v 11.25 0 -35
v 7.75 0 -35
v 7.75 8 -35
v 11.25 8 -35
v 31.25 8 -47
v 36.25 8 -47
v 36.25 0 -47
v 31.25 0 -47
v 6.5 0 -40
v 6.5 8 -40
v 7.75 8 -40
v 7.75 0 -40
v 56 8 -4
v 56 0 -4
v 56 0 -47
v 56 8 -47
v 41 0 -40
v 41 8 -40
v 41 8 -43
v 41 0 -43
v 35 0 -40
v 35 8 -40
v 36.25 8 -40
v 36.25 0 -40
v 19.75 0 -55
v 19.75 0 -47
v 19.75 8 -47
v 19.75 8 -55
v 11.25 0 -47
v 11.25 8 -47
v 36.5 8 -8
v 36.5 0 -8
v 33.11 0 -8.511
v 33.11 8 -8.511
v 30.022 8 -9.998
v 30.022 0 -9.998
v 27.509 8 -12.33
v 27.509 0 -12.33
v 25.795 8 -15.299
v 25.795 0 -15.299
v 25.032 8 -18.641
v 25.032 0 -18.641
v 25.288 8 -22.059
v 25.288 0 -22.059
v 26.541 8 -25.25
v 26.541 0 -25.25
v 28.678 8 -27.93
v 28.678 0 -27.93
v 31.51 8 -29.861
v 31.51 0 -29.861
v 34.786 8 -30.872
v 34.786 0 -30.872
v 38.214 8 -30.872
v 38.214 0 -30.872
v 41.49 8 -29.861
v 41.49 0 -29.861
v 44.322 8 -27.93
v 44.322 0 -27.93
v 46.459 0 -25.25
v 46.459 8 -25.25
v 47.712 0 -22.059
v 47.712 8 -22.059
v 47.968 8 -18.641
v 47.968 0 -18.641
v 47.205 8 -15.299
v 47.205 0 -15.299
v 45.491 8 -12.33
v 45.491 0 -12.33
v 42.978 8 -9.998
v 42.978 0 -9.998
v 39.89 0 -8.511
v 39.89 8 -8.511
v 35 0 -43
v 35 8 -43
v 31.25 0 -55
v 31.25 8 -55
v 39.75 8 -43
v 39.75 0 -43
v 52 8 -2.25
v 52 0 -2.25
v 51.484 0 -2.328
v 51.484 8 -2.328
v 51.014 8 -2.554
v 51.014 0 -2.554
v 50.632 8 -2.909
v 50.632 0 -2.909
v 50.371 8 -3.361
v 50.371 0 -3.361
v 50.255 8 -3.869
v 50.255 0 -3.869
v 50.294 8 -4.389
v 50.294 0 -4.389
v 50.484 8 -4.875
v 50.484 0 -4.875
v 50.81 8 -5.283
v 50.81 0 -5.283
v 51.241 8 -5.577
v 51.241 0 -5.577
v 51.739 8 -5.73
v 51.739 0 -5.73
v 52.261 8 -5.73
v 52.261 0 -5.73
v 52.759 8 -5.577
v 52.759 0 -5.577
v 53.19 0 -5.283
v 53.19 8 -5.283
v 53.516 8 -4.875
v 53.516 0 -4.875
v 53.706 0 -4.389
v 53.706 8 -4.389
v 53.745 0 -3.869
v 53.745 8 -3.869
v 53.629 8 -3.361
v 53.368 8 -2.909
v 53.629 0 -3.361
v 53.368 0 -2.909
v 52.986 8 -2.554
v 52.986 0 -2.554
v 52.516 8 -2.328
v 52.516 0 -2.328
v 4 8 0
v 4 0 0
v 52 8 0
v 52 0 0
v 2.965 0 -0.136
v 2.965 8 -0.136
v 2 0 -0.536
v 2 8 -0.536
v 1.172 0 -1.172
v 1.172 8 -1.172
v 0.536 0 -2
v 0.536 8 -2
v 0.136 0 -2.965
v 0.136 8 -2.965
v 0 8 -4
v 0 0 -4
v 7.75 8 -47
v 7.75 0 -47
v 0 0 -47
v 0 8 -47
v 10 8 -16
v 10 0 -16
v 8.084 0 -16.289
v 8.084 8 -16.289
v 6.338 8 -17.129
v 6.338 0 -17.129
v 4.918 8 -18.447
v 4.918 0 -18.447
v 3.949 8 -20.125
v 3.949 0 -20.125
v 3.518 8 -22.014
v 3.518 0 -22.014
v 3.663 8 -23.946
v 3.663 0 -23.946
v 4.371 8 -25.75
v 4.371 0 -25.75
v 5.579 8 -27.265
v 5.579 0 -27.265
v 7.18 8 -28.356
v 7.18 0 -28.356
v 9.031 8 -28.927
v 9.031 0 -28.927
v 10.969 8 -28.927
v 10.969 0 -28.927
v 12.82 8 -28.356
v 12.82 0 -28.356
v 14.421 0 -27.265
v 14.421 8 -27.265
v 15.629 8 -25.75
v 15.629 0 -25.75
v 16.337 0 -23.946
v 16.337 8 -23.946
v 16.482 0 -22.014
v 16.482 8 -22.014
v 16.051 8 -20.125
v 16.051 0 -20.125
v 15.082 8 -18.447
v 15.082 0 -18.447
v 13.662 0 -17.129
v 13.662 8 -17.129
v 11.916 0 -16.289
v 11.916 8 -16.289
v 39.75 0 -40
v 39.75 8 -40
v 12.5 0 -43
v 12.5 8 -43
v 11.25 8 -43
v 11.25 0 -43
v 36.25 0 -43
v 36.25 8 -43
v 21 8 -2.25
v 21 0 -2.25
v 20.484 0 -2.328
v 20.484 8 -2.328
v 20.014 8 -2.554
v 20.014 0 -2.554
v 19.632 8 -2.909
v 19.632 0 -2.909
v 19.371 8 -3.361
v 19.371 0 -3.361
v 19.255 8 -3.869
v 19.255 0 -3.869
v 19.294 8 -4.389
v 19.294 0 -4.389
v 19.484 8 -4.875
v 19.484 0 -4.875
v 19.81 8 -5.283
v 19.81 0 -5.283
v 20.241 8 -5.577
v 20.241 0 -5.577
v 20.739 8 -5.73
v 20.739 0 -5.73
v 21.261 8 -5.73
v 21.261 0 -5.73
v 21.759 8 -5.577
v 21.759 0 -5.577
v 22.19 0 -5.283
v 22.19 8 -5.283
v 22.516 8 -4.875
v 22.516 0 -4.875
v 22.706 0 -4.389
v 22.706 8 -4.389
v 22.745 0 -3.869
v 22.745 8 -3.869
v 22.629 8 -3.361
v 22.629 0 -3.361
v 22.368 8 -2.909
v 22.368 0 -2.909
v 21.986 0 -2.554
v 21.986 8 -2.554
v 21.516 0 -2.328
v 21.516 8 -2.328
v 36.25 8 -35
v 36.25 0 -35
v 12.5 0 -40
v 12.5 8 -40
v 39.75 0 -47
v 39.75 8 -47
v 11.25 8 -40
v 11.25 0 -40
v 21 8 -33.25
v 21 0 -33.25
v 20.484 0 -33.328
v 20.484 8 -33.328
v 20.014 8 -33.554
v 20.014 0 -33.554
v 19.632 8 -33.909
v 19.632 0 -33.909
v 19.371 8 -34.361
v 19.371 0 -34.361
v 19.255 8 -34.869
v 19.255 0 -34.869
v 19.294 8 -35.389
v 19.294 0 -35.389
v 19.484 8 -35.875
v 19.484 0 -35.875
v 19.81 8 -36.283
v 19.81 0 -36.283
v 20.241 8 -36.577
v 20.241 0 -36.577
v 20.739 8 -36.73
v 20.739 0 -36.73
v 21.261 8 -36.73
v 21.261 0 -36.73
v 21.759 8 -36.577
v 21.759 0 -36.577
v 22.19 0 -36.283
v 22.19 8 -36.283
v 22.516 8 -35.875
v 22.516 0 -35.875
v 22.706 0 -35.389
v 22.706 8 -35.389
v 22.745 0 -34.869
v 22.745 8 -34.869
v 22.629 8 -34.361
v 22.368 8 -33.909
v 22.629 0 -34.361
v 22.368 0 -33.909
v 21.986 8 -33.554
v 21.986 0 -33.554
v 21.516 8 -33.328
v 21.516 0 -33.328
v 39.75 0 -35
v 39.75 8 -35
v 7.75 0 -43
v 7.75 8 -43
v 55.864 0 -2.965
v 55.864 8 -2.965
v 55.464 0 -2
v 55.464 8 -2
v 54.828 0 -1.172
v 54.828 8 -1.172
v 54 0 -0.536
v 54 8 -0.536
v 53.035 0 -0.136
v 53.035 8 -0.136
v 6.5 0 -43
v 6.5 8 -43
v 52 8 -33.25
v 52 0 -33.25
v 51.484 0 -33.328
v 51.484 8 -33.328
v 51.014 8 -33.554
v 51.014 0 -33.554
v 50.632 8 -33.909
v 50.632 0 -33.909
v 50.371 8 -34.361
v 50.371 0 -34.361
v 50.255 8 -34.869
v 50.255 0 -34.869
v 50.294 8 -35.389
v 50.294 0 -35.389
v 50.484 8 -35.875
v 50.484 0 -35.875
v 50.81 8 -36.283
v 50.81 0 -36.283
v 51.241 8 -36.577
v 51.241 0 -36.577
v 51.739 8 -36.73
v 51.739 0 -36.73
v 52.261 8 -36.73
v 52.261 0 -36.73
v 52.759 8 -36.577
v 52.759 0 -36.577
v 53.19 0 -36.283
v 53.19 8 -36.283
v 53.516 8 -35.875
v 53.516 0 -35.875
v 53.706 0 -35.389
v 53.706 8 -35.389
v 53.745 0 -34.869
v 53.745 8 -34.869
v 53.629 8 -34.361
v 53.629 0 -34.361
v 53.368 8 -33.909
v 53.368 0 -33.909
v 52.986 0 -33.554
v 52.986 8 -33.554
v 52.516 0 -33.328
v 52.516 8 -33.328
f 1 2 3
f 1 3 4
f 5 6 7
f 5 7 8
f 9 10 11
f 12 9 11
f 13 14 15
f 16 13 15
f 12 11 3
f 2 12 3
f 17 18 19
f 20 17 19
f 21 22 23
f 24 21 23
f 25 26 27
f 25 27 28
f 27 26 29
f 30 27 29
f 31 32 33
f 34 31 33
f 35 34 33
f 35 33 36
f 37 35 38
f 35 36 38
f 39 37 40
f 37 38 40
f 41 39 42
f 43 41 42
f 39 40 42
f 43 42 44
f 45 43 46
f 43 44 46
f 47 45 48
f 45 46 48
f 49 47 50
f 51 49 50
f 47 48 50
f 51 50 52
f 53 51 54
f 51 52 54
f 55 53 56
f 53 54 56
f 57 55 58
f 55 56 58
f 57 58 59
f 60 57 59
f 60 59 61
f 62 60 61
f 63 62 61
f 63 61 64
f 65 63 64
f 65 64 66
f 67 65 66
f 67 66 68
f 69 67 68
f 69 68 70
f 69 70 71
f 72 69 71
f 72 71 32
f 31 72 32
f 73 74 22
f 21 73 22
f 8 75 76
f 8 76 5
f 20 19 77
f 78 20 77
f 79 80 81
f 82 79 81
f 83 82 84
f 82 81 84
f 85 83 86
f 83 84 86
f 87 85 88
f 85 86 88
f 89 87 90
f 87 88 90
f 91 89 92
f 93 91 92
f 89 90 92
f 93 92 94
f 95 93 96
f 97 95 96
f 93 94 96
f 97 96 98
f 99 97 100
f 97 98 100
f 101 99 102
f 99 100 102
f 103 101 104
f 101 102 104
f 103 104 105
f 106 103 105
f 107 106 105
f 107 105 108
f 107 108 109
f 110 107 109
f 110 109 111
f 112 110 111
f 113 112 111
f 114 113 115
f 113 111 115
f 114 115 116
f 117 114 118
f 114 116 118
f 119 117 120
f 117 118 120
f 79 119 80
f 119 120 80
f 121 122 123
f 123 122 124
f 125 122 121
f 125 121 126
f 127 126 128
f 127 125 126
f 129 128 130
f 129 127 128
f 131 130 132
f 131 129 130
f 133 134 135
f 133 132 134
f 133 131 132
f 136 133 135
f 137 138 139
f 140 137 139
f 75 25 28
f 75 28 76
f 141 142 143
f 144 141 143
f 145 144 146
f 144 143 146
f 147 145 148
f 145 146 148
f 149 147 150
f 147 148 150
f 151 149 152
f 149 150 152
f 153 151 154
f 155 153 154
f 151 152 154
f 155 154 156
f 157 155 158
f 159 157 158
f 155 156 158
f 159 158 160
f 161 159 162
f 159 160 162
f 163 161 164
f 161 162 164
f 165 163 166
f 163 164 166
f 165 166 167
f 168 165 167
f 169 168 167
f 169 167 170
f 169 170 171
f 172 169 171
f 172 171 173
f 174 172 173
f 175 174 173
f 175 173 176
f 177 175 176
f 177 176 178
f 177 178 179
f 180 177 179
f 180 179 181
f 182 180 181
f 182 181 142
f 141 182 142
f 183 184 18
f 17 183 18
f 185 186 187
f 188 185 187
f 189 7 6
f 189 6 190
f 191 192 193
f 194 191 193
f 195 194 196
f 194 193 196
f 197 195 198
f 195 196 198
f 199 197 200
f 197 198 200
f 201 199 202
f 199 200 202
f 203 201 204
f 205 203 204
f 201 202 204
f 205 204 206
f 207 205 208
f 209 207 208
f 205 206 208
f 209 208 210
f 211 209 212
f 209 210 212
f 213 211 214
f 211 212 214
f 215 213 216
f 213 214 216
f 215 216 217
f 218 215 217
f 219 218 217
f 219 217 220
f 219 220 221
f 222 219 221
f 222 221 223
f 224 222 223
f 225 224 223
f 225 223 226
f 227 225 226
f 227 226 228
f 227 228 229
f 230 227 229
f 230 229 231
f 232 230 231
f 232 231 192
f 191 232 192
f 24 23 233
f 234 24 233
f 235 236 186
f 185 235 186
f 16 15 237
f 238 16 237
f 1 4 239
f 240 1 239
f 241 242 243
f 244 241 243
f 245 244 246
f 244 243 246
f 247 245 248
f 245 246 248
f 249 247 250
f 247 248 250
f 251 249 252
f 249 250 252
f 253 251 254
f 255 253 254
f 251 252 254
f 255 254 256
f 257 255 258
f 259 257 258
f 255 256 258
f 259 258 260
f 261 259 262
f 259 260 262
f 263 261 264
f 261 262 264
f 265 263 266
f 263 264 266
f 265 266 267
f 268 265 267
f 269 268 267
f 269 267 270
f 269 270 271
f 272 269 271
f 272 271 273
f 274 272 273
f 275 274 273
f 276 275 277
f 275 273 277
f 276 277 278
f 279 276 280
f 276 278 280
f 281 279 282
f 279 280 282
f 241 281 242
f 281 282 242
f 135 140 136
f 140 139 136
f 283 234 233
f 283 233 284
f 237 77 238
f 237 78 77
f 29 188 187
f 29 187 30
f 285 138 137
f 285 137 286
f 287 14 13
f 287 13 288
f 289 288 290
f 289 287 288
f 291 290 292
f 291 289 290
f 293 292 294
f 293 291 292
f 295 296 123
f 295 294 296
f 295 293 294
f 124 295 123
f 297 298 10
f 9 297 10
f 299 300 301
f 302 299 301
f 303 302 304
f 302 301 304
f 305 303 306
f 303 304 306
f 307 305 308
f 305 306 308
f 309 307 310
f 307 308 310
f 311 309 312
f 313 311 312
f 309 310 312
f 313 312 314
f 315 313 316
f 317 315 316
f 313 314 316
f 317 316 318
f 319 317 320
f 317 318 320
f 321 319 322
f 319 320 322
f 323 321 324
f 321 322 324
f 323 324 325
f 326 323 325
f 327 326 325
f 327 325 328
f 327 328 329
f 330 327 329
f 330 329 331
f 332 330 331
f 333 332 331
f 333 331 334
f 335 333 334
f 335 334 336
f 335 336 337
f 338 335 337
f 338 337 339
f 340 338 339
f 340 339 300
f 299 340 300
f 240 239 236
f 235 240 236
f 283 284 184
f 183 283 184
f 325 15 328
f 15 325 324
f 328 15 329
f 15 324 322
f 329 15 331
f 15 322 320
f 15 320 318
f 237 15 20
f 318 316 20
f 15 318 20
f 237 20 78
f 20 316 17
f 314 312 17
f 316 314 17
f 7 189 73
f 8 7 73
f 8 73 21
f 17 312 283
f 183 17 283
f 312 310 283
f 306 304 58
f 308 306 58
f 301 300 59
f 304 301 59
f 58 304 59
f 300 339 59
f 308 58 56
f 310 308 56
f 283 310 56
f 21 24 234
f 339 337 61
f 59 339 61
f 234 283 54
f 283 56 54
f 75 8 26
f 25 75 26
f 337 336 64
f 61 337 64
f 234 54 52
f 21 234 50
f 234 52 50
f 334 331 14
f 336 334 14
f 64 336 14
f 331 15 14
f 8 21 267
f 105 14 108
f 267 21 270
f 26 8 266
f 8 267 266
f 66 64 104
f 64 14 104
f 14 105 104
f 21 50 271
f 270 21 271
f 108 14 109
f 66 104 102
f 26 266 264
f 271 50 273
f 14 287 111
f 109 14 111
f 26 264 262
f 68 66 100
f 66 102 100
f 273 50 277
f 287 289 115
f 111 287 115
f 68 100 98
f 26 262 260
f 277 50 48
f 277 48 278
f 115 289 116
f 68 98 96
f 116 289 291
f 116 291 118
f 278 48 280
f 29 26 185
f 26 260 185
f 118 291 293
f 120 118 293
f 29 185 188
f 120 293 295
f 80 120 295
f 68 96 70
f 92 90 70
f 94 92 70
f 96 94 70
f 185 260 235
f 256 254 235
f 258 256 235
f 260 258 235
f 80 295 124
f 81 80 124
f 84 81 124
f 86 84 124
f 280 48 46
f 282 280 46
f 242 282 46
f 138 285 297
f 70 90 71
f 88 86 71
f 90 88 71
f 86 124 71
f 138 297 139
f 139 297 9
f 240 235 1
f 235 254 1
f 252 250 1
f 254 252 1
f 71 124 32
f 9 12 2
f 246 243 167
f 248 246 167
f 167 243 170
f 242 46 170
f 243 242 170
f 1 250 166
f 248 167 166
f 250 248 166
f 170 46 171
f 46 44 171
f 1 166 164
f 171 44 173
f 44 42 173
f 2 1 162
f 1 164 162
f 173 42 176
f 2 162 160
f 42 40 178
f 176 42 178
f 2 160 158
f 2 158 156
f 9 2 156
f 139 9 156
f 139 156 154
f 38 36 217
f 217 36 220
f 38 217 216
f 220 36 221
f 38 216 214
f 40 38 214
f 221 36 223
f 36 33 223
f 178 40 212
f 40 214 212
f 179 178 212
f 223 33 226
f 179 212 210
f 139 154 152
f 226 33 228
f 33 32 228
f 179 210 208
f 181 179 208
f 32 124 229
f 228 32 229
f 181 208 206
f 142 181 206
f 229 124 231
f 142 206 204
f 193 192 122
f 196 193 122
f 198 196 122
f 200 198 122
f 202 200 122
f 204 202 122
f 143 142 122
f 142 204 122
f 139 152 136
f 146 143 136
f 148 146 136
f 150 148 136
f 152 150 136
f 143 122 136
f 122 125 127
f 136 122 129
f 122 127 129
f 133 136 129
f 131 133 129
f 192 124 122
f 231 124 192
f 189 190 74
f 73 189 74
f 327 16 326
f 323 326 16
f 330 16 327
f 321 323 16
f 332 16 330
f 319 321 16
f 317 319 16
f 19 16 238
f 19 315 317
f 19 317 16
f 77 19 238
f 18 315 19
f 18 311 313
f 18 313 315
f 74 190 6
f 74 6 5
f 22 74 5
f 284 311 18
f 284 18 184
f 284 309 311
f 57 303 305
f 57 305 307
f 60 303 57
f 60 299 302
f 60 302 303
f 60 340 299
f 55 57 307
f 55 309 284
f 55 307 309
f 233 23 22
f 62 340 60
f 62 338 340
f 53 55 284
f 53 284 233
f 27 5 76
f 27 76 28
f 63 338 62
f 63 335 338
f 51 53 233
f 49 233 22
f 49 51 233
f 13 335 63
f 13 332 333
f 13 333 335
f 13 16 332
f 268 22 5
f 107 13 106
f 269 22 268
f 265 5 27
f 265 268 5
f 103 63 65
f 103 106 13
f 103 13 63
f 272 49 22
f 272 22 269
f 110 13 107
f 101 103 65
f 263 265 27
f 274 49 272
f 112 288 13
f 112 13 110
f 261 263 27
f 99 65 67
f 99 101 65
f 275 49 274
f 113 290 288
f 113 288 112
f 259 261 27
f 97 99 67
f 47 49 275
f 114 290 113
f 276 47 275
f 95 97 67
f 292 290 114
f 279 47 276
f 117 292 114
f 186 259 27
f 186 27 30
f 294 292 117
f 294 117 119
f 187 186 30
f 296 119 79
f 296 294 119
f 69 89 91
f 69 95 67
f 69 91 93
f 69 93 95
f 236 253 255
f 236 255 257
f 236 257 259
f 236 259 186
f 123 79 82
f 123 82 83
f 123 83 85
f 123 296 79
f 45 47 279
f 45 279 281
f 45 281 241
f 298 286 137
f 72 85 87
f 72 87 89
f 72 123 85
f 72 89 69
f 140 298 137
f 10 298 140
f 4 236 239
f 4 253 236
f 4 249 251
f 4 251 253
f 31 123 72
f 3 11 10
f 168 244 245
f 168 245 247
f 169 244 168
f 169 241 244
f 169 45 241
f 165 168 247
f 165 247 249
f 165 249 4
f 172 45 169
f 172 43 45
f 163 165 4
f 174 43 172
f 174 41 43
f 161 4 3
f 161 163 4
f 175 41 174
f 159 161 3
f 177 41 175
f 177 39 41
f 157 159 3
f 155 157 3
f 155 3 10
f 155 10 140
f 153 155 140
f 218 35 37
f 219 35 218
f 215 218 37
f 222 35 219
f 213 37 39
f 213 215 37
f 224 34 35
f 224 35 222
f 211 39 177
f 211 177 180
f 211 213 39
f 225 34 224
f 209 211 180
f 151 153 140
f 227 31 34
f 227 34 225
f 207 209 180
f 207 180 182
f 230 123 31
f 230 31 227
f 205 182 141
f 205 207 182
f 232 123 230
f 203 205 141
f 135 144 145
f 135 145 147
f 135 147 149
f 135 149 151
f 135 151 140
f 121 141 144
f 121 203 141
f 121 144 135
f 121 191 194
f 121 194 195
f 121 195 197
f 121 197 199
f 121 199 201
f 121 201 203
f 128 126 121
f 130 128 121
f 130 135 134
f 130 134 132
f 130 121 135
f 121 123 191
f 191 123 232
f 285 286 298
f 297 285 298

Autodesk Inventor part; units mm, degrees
ref_plane "YZ Plane" through (0, 0, 0) normal (1, 0, 0) x (0, 1, 0)
ref_plane "XY Plane" through (0, 0, 0) normal (0, 0, 1) x (1, 0, 0)
sketch "Sketch1" plane through (0, 0, 0) normal (0, 1, 0) x (-1, 0, 0)
  line L0 (-4, 0) -> (-52, 0)
  line L1 (-56, -4) -> (-56, -47)
  line L2 (0, -47) -> (0, -4)
  line L3 (-19.75, -47) -> (-19.75, -55)
  line L4 (-19.75, -55) -> (-31.25, -55)
  line L5 (-31.25, -55) -> (-31.25, -47)
  line L6 (-7.75, -47) -> (-7.75, -43)
  line L7 (-7.75, -43) -> (-6.5, -43)
  line L8 (-6.5, -43) -> (-6.5, -40)
  line L9 (-6.5, -40) -> (-7.75, -40)
  line L10 (-7.75, -40) -> (-7.75, -35)
  line L11 (-7.75, -35) -> (-11.25, -35)
  line L12 (-11.25, -35) -> (-11.25, -40)
  line L13 (-11.25, -40) -> (-12.5, -40)
  line L14 (-12.5, -40) -> (-12.5, -43)
  line L15 (-12.5, -43) -> (-11.25, -43)
  line L16 (-11.25, -43) -> (-11.25, -47)
  line L17 (-36.25, -47) -> (-36.25, -43)
  line L18 (-36.25, -43) -> (-35, -43)
  line L19 (-35, -43) -> (-35, -40)
  line L20 (-35, -40) -> (-36.25, -40)
  line L21 (-36.25, -40) -> (-36.25, -35)
  line L22 (-36.25, -35) -> (-39.75, -35)
  line L23 (-39.75, -35) -> (-39.75, -40)
  line L24 (-39.75, -40) -> (-41, -40)
  line L25 (-41, -40) -> (-41, -43)
  line L26 (-41, -43) -> (-39.75, -43)
  line L27 (-39.75, -43) -> (-39.75, -47)
  line L28 (-19.75, -47) -> (-11.25, -47)
  line L29 (-7.75, -47) -> (0, -47)
  line L30 (-56, -47) -> (-39.75, -47)
  line L31 (-36.25, -47) -> (-31.25, -47)
  arc A0 (0, -4) -> (-4, 0) centre (-4, -4) ccw
  arc A1 (-52, 0) -> (-56, -4) centre (-52, -4) ccw
  point P0 (0, 0)
  point P1 (-56, 0)
  dimension "d0" = 56
  dimension "d1" = 47
  dimension "d2" = 8
  dimension "d3" = 11.5
  dimension "d4" = 19.75
  dimension "d5" = 4
  dimension "d6" = 3
  dimension "d7" = 5
  dimension "d8" = 3.5
  dimension "d9" = 6
  dimension "d10" = 7.75
  dimension "d11" = 3.5
  dimension "d12" = 6
  dimension "d13" = 16.25
  dimension "d14" = 4
extrude "Extrusion1" add sketch "Sketch1" along normal blind 8
sketch "Sketch2" plane through (0, 8, 0) normal (0, 1, 0) x (1, 0, 0)
  line L0 (56, 4) -> (56, 47) construction
  line L1 (56, 47) -> (39.75, 47) construction
  line L2 (39.75, 47) -> (39.75, 43) construction
  line L3 (39.75, 43) -> (41, 43) construction
  line L4 (41, 43) -> (41, 40) construction
  line L5 (41, 40) -> (39.75, 40) construction
  line L6 (39.75, 40) -> (39.75, 35) construction
  line L7 (39.75, 35) -> (36.25, 35) construction
  line L8 (36.25, 35) -> (36.25, 40) construction
  line L9 (36.25, 40) -> (35, 40) construction
  line L10 (35, 40) -> (35, 43) construction
  line L11 (35, 43) -> (36.25, 43) construction
  line L12 (36.25, 43) -> (36.25, 47) construction
  line L13 (36.25, 47) -> (31.25, 47) construction
  line L14 (31.25, 47) -> (31.25, 55) construction
  line L15 (31.25, 55) -> (19.75, 55) construction
  line L16 (19.75, 55) -> (19.75, 47) construction
  line L17 (19.75, 47) -> (11.25, 47) construction
  line L18 (11.25, 47) -> (11.25, 43) construction
  line L19 (11.25, 43) -> (12.5, 43) construction
  line L20 (12.5, 43) -> (12.5, 40) construction
  line L21 (12.5, 40) -> (11.25, 40) construction
  line L22 (11.25, 40) -> (11.25, 35) construction
  line L23 (11.25, 35) -> (7.75, 35) construction
  line L24 (7.75, 35) -> (7.75, 40) construction
  line L25 (7.75, 40) -> (6.5, 40) construction
  line L26 (6.5, 40) -> (6.5, 43) construction
  line L27 (6.5, 43) -> (7.75, 43) construction
  line L28 (7.75, 43) -> (7.75, 47) construction
  line L29 (7.75, 47) -> (0, 47) construction
  line L30 (0, 47) -> (0, 4) construction
  arc A0 (0, 4) -> (4, 0) centre (4, 4) ccw construction
  line L31 (4, 0) -> (52, 0) construction
  arc A1 (52, 0) -> (56, 4) centre (52, 4) ccw construction
  line L32 (21, 4) -> (52, 4) construction
  line L33 (52, 4) -> (52, 35) construction
  line L34 (52, 35) -> (21, 35) construction
  line L35 (21, 35) -> (21, 4) construction
  line L36 (21, 35) -> (52, 4) construction
  point P0 (0, 0)
  point P1 (36.5, 19.5)
  point P2 (10, 22.5)
  dimension "d17" = 31
  dimension "d18" = 31
  dimension "d19" = 4
  dimension "d20" = 4
  dimension "d21" = 22.5
  dimension "d22" = 10
hole "Hole1" at (21, 8, -35) at (52, 8, -35) at (52, 8, -4) at (21, 8, -4) direction (0, -1, 0) diameter 3.5 end through all
hole "Hole2" at (36.5, 8, -19.5) direction (0, -1, 0) diameter 23 end through all
hole "Hole3" at (10, 8, -22.5) direction (0, -1, 0) diameter 13 end through all
ref_plane "Work Plane1" through (0, 4, 0) normal (0, 1, 0) x (-1, 0, 0)
equation "\"d11\" = d8"
equation "\"d12\" = d9"
equation "\"d44\" = 0.5 * THICKNESS"
equation "\"THICKNESS\" = 8"
properties part number "A8-0003"
